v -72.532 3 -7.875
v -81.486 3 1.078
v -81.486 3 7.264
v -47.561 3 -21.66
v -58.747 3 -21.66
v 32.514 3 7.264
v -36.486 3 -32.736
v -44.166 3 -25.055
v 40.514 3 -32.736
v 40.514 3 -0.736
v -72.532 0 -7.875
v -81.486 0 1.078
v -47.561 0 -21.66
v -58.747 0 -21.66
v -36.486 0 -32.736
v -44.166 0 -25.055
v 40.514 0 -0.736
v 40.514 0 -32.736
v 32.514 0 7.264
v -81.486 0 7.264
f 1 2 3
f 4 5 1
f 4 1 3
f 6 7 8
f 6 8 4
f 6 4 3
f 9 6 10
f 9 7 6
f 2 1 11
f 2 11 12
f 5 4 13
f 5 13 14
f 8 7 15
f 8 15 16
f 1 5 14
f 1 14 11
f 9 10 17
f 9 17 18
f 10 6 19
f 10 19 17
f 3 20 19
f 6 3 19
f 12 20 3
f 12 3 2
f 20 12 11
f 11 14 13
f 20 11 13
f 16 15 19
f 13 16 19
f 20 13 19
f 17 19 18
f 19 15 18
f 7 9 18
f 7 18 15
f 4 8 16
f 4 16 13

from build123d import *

# Parameters (mm, degrees)
SKETCH1_W           = 114
SKETCH1_H           = 40
BOSS_EXTRUDE1_DEPTH = 3
CUT_EXTRUDE1_DEPTH  = 4
BOSS_EXTRUDE2_DEPTH = 3


with BuildPart() as part:
    # Sketch1 → Boss-Extrude1 (new body)
    with BuildSketch(Plane(origin=(0, 0, 0), x_dir=(1, 0, 0), z_dir=(0, 1, 0))):
        with Locations((-24.485507246, 12.735507246)):
            Rectangle(SKETCH1_W, SKETCH1_H)
    extrude(amount=BOSS_EXTRUDE1_DEPTH)

    # Sketch2 → Cut-Extrude1 (cut, through all)
    with BuildSketch(Plane(origin=(0, 3, 0), x_dir=(1, 0, 0), z_dir=(0, 1, 0))):
        Polygon((-36.485507246, 32.735507246), (-44.165937049, 25.055077444), (-47.560826058, 21.660188435), (-58.747394556, 21.660188435), (-72.532338505, 7.875244486), (-81.485507246, -1.077924256), (-81.485507246, 32.735507246), align=None)
    extrude(amount=-CUT_EXTRUDE1_DEPTH, mode=Mode.SUBTRACT)

    # Sketch3 → Boss-Extrude2 (add, through all)
    with BuildSketch(Plane(origin=(0, 3, 0), x_dir=(1, 0, 0), z_dir=(0, 1, 0))):
        Polygon((32.514492754, -7.264492754), (40.514492754, 0.735507246), (40.514492754, 32.735507246), (32.514492754, 32.735507246), align=None)
    extrude(amount=-BOSS_EXTRUDE2_DEPTH)


solid = part.part
